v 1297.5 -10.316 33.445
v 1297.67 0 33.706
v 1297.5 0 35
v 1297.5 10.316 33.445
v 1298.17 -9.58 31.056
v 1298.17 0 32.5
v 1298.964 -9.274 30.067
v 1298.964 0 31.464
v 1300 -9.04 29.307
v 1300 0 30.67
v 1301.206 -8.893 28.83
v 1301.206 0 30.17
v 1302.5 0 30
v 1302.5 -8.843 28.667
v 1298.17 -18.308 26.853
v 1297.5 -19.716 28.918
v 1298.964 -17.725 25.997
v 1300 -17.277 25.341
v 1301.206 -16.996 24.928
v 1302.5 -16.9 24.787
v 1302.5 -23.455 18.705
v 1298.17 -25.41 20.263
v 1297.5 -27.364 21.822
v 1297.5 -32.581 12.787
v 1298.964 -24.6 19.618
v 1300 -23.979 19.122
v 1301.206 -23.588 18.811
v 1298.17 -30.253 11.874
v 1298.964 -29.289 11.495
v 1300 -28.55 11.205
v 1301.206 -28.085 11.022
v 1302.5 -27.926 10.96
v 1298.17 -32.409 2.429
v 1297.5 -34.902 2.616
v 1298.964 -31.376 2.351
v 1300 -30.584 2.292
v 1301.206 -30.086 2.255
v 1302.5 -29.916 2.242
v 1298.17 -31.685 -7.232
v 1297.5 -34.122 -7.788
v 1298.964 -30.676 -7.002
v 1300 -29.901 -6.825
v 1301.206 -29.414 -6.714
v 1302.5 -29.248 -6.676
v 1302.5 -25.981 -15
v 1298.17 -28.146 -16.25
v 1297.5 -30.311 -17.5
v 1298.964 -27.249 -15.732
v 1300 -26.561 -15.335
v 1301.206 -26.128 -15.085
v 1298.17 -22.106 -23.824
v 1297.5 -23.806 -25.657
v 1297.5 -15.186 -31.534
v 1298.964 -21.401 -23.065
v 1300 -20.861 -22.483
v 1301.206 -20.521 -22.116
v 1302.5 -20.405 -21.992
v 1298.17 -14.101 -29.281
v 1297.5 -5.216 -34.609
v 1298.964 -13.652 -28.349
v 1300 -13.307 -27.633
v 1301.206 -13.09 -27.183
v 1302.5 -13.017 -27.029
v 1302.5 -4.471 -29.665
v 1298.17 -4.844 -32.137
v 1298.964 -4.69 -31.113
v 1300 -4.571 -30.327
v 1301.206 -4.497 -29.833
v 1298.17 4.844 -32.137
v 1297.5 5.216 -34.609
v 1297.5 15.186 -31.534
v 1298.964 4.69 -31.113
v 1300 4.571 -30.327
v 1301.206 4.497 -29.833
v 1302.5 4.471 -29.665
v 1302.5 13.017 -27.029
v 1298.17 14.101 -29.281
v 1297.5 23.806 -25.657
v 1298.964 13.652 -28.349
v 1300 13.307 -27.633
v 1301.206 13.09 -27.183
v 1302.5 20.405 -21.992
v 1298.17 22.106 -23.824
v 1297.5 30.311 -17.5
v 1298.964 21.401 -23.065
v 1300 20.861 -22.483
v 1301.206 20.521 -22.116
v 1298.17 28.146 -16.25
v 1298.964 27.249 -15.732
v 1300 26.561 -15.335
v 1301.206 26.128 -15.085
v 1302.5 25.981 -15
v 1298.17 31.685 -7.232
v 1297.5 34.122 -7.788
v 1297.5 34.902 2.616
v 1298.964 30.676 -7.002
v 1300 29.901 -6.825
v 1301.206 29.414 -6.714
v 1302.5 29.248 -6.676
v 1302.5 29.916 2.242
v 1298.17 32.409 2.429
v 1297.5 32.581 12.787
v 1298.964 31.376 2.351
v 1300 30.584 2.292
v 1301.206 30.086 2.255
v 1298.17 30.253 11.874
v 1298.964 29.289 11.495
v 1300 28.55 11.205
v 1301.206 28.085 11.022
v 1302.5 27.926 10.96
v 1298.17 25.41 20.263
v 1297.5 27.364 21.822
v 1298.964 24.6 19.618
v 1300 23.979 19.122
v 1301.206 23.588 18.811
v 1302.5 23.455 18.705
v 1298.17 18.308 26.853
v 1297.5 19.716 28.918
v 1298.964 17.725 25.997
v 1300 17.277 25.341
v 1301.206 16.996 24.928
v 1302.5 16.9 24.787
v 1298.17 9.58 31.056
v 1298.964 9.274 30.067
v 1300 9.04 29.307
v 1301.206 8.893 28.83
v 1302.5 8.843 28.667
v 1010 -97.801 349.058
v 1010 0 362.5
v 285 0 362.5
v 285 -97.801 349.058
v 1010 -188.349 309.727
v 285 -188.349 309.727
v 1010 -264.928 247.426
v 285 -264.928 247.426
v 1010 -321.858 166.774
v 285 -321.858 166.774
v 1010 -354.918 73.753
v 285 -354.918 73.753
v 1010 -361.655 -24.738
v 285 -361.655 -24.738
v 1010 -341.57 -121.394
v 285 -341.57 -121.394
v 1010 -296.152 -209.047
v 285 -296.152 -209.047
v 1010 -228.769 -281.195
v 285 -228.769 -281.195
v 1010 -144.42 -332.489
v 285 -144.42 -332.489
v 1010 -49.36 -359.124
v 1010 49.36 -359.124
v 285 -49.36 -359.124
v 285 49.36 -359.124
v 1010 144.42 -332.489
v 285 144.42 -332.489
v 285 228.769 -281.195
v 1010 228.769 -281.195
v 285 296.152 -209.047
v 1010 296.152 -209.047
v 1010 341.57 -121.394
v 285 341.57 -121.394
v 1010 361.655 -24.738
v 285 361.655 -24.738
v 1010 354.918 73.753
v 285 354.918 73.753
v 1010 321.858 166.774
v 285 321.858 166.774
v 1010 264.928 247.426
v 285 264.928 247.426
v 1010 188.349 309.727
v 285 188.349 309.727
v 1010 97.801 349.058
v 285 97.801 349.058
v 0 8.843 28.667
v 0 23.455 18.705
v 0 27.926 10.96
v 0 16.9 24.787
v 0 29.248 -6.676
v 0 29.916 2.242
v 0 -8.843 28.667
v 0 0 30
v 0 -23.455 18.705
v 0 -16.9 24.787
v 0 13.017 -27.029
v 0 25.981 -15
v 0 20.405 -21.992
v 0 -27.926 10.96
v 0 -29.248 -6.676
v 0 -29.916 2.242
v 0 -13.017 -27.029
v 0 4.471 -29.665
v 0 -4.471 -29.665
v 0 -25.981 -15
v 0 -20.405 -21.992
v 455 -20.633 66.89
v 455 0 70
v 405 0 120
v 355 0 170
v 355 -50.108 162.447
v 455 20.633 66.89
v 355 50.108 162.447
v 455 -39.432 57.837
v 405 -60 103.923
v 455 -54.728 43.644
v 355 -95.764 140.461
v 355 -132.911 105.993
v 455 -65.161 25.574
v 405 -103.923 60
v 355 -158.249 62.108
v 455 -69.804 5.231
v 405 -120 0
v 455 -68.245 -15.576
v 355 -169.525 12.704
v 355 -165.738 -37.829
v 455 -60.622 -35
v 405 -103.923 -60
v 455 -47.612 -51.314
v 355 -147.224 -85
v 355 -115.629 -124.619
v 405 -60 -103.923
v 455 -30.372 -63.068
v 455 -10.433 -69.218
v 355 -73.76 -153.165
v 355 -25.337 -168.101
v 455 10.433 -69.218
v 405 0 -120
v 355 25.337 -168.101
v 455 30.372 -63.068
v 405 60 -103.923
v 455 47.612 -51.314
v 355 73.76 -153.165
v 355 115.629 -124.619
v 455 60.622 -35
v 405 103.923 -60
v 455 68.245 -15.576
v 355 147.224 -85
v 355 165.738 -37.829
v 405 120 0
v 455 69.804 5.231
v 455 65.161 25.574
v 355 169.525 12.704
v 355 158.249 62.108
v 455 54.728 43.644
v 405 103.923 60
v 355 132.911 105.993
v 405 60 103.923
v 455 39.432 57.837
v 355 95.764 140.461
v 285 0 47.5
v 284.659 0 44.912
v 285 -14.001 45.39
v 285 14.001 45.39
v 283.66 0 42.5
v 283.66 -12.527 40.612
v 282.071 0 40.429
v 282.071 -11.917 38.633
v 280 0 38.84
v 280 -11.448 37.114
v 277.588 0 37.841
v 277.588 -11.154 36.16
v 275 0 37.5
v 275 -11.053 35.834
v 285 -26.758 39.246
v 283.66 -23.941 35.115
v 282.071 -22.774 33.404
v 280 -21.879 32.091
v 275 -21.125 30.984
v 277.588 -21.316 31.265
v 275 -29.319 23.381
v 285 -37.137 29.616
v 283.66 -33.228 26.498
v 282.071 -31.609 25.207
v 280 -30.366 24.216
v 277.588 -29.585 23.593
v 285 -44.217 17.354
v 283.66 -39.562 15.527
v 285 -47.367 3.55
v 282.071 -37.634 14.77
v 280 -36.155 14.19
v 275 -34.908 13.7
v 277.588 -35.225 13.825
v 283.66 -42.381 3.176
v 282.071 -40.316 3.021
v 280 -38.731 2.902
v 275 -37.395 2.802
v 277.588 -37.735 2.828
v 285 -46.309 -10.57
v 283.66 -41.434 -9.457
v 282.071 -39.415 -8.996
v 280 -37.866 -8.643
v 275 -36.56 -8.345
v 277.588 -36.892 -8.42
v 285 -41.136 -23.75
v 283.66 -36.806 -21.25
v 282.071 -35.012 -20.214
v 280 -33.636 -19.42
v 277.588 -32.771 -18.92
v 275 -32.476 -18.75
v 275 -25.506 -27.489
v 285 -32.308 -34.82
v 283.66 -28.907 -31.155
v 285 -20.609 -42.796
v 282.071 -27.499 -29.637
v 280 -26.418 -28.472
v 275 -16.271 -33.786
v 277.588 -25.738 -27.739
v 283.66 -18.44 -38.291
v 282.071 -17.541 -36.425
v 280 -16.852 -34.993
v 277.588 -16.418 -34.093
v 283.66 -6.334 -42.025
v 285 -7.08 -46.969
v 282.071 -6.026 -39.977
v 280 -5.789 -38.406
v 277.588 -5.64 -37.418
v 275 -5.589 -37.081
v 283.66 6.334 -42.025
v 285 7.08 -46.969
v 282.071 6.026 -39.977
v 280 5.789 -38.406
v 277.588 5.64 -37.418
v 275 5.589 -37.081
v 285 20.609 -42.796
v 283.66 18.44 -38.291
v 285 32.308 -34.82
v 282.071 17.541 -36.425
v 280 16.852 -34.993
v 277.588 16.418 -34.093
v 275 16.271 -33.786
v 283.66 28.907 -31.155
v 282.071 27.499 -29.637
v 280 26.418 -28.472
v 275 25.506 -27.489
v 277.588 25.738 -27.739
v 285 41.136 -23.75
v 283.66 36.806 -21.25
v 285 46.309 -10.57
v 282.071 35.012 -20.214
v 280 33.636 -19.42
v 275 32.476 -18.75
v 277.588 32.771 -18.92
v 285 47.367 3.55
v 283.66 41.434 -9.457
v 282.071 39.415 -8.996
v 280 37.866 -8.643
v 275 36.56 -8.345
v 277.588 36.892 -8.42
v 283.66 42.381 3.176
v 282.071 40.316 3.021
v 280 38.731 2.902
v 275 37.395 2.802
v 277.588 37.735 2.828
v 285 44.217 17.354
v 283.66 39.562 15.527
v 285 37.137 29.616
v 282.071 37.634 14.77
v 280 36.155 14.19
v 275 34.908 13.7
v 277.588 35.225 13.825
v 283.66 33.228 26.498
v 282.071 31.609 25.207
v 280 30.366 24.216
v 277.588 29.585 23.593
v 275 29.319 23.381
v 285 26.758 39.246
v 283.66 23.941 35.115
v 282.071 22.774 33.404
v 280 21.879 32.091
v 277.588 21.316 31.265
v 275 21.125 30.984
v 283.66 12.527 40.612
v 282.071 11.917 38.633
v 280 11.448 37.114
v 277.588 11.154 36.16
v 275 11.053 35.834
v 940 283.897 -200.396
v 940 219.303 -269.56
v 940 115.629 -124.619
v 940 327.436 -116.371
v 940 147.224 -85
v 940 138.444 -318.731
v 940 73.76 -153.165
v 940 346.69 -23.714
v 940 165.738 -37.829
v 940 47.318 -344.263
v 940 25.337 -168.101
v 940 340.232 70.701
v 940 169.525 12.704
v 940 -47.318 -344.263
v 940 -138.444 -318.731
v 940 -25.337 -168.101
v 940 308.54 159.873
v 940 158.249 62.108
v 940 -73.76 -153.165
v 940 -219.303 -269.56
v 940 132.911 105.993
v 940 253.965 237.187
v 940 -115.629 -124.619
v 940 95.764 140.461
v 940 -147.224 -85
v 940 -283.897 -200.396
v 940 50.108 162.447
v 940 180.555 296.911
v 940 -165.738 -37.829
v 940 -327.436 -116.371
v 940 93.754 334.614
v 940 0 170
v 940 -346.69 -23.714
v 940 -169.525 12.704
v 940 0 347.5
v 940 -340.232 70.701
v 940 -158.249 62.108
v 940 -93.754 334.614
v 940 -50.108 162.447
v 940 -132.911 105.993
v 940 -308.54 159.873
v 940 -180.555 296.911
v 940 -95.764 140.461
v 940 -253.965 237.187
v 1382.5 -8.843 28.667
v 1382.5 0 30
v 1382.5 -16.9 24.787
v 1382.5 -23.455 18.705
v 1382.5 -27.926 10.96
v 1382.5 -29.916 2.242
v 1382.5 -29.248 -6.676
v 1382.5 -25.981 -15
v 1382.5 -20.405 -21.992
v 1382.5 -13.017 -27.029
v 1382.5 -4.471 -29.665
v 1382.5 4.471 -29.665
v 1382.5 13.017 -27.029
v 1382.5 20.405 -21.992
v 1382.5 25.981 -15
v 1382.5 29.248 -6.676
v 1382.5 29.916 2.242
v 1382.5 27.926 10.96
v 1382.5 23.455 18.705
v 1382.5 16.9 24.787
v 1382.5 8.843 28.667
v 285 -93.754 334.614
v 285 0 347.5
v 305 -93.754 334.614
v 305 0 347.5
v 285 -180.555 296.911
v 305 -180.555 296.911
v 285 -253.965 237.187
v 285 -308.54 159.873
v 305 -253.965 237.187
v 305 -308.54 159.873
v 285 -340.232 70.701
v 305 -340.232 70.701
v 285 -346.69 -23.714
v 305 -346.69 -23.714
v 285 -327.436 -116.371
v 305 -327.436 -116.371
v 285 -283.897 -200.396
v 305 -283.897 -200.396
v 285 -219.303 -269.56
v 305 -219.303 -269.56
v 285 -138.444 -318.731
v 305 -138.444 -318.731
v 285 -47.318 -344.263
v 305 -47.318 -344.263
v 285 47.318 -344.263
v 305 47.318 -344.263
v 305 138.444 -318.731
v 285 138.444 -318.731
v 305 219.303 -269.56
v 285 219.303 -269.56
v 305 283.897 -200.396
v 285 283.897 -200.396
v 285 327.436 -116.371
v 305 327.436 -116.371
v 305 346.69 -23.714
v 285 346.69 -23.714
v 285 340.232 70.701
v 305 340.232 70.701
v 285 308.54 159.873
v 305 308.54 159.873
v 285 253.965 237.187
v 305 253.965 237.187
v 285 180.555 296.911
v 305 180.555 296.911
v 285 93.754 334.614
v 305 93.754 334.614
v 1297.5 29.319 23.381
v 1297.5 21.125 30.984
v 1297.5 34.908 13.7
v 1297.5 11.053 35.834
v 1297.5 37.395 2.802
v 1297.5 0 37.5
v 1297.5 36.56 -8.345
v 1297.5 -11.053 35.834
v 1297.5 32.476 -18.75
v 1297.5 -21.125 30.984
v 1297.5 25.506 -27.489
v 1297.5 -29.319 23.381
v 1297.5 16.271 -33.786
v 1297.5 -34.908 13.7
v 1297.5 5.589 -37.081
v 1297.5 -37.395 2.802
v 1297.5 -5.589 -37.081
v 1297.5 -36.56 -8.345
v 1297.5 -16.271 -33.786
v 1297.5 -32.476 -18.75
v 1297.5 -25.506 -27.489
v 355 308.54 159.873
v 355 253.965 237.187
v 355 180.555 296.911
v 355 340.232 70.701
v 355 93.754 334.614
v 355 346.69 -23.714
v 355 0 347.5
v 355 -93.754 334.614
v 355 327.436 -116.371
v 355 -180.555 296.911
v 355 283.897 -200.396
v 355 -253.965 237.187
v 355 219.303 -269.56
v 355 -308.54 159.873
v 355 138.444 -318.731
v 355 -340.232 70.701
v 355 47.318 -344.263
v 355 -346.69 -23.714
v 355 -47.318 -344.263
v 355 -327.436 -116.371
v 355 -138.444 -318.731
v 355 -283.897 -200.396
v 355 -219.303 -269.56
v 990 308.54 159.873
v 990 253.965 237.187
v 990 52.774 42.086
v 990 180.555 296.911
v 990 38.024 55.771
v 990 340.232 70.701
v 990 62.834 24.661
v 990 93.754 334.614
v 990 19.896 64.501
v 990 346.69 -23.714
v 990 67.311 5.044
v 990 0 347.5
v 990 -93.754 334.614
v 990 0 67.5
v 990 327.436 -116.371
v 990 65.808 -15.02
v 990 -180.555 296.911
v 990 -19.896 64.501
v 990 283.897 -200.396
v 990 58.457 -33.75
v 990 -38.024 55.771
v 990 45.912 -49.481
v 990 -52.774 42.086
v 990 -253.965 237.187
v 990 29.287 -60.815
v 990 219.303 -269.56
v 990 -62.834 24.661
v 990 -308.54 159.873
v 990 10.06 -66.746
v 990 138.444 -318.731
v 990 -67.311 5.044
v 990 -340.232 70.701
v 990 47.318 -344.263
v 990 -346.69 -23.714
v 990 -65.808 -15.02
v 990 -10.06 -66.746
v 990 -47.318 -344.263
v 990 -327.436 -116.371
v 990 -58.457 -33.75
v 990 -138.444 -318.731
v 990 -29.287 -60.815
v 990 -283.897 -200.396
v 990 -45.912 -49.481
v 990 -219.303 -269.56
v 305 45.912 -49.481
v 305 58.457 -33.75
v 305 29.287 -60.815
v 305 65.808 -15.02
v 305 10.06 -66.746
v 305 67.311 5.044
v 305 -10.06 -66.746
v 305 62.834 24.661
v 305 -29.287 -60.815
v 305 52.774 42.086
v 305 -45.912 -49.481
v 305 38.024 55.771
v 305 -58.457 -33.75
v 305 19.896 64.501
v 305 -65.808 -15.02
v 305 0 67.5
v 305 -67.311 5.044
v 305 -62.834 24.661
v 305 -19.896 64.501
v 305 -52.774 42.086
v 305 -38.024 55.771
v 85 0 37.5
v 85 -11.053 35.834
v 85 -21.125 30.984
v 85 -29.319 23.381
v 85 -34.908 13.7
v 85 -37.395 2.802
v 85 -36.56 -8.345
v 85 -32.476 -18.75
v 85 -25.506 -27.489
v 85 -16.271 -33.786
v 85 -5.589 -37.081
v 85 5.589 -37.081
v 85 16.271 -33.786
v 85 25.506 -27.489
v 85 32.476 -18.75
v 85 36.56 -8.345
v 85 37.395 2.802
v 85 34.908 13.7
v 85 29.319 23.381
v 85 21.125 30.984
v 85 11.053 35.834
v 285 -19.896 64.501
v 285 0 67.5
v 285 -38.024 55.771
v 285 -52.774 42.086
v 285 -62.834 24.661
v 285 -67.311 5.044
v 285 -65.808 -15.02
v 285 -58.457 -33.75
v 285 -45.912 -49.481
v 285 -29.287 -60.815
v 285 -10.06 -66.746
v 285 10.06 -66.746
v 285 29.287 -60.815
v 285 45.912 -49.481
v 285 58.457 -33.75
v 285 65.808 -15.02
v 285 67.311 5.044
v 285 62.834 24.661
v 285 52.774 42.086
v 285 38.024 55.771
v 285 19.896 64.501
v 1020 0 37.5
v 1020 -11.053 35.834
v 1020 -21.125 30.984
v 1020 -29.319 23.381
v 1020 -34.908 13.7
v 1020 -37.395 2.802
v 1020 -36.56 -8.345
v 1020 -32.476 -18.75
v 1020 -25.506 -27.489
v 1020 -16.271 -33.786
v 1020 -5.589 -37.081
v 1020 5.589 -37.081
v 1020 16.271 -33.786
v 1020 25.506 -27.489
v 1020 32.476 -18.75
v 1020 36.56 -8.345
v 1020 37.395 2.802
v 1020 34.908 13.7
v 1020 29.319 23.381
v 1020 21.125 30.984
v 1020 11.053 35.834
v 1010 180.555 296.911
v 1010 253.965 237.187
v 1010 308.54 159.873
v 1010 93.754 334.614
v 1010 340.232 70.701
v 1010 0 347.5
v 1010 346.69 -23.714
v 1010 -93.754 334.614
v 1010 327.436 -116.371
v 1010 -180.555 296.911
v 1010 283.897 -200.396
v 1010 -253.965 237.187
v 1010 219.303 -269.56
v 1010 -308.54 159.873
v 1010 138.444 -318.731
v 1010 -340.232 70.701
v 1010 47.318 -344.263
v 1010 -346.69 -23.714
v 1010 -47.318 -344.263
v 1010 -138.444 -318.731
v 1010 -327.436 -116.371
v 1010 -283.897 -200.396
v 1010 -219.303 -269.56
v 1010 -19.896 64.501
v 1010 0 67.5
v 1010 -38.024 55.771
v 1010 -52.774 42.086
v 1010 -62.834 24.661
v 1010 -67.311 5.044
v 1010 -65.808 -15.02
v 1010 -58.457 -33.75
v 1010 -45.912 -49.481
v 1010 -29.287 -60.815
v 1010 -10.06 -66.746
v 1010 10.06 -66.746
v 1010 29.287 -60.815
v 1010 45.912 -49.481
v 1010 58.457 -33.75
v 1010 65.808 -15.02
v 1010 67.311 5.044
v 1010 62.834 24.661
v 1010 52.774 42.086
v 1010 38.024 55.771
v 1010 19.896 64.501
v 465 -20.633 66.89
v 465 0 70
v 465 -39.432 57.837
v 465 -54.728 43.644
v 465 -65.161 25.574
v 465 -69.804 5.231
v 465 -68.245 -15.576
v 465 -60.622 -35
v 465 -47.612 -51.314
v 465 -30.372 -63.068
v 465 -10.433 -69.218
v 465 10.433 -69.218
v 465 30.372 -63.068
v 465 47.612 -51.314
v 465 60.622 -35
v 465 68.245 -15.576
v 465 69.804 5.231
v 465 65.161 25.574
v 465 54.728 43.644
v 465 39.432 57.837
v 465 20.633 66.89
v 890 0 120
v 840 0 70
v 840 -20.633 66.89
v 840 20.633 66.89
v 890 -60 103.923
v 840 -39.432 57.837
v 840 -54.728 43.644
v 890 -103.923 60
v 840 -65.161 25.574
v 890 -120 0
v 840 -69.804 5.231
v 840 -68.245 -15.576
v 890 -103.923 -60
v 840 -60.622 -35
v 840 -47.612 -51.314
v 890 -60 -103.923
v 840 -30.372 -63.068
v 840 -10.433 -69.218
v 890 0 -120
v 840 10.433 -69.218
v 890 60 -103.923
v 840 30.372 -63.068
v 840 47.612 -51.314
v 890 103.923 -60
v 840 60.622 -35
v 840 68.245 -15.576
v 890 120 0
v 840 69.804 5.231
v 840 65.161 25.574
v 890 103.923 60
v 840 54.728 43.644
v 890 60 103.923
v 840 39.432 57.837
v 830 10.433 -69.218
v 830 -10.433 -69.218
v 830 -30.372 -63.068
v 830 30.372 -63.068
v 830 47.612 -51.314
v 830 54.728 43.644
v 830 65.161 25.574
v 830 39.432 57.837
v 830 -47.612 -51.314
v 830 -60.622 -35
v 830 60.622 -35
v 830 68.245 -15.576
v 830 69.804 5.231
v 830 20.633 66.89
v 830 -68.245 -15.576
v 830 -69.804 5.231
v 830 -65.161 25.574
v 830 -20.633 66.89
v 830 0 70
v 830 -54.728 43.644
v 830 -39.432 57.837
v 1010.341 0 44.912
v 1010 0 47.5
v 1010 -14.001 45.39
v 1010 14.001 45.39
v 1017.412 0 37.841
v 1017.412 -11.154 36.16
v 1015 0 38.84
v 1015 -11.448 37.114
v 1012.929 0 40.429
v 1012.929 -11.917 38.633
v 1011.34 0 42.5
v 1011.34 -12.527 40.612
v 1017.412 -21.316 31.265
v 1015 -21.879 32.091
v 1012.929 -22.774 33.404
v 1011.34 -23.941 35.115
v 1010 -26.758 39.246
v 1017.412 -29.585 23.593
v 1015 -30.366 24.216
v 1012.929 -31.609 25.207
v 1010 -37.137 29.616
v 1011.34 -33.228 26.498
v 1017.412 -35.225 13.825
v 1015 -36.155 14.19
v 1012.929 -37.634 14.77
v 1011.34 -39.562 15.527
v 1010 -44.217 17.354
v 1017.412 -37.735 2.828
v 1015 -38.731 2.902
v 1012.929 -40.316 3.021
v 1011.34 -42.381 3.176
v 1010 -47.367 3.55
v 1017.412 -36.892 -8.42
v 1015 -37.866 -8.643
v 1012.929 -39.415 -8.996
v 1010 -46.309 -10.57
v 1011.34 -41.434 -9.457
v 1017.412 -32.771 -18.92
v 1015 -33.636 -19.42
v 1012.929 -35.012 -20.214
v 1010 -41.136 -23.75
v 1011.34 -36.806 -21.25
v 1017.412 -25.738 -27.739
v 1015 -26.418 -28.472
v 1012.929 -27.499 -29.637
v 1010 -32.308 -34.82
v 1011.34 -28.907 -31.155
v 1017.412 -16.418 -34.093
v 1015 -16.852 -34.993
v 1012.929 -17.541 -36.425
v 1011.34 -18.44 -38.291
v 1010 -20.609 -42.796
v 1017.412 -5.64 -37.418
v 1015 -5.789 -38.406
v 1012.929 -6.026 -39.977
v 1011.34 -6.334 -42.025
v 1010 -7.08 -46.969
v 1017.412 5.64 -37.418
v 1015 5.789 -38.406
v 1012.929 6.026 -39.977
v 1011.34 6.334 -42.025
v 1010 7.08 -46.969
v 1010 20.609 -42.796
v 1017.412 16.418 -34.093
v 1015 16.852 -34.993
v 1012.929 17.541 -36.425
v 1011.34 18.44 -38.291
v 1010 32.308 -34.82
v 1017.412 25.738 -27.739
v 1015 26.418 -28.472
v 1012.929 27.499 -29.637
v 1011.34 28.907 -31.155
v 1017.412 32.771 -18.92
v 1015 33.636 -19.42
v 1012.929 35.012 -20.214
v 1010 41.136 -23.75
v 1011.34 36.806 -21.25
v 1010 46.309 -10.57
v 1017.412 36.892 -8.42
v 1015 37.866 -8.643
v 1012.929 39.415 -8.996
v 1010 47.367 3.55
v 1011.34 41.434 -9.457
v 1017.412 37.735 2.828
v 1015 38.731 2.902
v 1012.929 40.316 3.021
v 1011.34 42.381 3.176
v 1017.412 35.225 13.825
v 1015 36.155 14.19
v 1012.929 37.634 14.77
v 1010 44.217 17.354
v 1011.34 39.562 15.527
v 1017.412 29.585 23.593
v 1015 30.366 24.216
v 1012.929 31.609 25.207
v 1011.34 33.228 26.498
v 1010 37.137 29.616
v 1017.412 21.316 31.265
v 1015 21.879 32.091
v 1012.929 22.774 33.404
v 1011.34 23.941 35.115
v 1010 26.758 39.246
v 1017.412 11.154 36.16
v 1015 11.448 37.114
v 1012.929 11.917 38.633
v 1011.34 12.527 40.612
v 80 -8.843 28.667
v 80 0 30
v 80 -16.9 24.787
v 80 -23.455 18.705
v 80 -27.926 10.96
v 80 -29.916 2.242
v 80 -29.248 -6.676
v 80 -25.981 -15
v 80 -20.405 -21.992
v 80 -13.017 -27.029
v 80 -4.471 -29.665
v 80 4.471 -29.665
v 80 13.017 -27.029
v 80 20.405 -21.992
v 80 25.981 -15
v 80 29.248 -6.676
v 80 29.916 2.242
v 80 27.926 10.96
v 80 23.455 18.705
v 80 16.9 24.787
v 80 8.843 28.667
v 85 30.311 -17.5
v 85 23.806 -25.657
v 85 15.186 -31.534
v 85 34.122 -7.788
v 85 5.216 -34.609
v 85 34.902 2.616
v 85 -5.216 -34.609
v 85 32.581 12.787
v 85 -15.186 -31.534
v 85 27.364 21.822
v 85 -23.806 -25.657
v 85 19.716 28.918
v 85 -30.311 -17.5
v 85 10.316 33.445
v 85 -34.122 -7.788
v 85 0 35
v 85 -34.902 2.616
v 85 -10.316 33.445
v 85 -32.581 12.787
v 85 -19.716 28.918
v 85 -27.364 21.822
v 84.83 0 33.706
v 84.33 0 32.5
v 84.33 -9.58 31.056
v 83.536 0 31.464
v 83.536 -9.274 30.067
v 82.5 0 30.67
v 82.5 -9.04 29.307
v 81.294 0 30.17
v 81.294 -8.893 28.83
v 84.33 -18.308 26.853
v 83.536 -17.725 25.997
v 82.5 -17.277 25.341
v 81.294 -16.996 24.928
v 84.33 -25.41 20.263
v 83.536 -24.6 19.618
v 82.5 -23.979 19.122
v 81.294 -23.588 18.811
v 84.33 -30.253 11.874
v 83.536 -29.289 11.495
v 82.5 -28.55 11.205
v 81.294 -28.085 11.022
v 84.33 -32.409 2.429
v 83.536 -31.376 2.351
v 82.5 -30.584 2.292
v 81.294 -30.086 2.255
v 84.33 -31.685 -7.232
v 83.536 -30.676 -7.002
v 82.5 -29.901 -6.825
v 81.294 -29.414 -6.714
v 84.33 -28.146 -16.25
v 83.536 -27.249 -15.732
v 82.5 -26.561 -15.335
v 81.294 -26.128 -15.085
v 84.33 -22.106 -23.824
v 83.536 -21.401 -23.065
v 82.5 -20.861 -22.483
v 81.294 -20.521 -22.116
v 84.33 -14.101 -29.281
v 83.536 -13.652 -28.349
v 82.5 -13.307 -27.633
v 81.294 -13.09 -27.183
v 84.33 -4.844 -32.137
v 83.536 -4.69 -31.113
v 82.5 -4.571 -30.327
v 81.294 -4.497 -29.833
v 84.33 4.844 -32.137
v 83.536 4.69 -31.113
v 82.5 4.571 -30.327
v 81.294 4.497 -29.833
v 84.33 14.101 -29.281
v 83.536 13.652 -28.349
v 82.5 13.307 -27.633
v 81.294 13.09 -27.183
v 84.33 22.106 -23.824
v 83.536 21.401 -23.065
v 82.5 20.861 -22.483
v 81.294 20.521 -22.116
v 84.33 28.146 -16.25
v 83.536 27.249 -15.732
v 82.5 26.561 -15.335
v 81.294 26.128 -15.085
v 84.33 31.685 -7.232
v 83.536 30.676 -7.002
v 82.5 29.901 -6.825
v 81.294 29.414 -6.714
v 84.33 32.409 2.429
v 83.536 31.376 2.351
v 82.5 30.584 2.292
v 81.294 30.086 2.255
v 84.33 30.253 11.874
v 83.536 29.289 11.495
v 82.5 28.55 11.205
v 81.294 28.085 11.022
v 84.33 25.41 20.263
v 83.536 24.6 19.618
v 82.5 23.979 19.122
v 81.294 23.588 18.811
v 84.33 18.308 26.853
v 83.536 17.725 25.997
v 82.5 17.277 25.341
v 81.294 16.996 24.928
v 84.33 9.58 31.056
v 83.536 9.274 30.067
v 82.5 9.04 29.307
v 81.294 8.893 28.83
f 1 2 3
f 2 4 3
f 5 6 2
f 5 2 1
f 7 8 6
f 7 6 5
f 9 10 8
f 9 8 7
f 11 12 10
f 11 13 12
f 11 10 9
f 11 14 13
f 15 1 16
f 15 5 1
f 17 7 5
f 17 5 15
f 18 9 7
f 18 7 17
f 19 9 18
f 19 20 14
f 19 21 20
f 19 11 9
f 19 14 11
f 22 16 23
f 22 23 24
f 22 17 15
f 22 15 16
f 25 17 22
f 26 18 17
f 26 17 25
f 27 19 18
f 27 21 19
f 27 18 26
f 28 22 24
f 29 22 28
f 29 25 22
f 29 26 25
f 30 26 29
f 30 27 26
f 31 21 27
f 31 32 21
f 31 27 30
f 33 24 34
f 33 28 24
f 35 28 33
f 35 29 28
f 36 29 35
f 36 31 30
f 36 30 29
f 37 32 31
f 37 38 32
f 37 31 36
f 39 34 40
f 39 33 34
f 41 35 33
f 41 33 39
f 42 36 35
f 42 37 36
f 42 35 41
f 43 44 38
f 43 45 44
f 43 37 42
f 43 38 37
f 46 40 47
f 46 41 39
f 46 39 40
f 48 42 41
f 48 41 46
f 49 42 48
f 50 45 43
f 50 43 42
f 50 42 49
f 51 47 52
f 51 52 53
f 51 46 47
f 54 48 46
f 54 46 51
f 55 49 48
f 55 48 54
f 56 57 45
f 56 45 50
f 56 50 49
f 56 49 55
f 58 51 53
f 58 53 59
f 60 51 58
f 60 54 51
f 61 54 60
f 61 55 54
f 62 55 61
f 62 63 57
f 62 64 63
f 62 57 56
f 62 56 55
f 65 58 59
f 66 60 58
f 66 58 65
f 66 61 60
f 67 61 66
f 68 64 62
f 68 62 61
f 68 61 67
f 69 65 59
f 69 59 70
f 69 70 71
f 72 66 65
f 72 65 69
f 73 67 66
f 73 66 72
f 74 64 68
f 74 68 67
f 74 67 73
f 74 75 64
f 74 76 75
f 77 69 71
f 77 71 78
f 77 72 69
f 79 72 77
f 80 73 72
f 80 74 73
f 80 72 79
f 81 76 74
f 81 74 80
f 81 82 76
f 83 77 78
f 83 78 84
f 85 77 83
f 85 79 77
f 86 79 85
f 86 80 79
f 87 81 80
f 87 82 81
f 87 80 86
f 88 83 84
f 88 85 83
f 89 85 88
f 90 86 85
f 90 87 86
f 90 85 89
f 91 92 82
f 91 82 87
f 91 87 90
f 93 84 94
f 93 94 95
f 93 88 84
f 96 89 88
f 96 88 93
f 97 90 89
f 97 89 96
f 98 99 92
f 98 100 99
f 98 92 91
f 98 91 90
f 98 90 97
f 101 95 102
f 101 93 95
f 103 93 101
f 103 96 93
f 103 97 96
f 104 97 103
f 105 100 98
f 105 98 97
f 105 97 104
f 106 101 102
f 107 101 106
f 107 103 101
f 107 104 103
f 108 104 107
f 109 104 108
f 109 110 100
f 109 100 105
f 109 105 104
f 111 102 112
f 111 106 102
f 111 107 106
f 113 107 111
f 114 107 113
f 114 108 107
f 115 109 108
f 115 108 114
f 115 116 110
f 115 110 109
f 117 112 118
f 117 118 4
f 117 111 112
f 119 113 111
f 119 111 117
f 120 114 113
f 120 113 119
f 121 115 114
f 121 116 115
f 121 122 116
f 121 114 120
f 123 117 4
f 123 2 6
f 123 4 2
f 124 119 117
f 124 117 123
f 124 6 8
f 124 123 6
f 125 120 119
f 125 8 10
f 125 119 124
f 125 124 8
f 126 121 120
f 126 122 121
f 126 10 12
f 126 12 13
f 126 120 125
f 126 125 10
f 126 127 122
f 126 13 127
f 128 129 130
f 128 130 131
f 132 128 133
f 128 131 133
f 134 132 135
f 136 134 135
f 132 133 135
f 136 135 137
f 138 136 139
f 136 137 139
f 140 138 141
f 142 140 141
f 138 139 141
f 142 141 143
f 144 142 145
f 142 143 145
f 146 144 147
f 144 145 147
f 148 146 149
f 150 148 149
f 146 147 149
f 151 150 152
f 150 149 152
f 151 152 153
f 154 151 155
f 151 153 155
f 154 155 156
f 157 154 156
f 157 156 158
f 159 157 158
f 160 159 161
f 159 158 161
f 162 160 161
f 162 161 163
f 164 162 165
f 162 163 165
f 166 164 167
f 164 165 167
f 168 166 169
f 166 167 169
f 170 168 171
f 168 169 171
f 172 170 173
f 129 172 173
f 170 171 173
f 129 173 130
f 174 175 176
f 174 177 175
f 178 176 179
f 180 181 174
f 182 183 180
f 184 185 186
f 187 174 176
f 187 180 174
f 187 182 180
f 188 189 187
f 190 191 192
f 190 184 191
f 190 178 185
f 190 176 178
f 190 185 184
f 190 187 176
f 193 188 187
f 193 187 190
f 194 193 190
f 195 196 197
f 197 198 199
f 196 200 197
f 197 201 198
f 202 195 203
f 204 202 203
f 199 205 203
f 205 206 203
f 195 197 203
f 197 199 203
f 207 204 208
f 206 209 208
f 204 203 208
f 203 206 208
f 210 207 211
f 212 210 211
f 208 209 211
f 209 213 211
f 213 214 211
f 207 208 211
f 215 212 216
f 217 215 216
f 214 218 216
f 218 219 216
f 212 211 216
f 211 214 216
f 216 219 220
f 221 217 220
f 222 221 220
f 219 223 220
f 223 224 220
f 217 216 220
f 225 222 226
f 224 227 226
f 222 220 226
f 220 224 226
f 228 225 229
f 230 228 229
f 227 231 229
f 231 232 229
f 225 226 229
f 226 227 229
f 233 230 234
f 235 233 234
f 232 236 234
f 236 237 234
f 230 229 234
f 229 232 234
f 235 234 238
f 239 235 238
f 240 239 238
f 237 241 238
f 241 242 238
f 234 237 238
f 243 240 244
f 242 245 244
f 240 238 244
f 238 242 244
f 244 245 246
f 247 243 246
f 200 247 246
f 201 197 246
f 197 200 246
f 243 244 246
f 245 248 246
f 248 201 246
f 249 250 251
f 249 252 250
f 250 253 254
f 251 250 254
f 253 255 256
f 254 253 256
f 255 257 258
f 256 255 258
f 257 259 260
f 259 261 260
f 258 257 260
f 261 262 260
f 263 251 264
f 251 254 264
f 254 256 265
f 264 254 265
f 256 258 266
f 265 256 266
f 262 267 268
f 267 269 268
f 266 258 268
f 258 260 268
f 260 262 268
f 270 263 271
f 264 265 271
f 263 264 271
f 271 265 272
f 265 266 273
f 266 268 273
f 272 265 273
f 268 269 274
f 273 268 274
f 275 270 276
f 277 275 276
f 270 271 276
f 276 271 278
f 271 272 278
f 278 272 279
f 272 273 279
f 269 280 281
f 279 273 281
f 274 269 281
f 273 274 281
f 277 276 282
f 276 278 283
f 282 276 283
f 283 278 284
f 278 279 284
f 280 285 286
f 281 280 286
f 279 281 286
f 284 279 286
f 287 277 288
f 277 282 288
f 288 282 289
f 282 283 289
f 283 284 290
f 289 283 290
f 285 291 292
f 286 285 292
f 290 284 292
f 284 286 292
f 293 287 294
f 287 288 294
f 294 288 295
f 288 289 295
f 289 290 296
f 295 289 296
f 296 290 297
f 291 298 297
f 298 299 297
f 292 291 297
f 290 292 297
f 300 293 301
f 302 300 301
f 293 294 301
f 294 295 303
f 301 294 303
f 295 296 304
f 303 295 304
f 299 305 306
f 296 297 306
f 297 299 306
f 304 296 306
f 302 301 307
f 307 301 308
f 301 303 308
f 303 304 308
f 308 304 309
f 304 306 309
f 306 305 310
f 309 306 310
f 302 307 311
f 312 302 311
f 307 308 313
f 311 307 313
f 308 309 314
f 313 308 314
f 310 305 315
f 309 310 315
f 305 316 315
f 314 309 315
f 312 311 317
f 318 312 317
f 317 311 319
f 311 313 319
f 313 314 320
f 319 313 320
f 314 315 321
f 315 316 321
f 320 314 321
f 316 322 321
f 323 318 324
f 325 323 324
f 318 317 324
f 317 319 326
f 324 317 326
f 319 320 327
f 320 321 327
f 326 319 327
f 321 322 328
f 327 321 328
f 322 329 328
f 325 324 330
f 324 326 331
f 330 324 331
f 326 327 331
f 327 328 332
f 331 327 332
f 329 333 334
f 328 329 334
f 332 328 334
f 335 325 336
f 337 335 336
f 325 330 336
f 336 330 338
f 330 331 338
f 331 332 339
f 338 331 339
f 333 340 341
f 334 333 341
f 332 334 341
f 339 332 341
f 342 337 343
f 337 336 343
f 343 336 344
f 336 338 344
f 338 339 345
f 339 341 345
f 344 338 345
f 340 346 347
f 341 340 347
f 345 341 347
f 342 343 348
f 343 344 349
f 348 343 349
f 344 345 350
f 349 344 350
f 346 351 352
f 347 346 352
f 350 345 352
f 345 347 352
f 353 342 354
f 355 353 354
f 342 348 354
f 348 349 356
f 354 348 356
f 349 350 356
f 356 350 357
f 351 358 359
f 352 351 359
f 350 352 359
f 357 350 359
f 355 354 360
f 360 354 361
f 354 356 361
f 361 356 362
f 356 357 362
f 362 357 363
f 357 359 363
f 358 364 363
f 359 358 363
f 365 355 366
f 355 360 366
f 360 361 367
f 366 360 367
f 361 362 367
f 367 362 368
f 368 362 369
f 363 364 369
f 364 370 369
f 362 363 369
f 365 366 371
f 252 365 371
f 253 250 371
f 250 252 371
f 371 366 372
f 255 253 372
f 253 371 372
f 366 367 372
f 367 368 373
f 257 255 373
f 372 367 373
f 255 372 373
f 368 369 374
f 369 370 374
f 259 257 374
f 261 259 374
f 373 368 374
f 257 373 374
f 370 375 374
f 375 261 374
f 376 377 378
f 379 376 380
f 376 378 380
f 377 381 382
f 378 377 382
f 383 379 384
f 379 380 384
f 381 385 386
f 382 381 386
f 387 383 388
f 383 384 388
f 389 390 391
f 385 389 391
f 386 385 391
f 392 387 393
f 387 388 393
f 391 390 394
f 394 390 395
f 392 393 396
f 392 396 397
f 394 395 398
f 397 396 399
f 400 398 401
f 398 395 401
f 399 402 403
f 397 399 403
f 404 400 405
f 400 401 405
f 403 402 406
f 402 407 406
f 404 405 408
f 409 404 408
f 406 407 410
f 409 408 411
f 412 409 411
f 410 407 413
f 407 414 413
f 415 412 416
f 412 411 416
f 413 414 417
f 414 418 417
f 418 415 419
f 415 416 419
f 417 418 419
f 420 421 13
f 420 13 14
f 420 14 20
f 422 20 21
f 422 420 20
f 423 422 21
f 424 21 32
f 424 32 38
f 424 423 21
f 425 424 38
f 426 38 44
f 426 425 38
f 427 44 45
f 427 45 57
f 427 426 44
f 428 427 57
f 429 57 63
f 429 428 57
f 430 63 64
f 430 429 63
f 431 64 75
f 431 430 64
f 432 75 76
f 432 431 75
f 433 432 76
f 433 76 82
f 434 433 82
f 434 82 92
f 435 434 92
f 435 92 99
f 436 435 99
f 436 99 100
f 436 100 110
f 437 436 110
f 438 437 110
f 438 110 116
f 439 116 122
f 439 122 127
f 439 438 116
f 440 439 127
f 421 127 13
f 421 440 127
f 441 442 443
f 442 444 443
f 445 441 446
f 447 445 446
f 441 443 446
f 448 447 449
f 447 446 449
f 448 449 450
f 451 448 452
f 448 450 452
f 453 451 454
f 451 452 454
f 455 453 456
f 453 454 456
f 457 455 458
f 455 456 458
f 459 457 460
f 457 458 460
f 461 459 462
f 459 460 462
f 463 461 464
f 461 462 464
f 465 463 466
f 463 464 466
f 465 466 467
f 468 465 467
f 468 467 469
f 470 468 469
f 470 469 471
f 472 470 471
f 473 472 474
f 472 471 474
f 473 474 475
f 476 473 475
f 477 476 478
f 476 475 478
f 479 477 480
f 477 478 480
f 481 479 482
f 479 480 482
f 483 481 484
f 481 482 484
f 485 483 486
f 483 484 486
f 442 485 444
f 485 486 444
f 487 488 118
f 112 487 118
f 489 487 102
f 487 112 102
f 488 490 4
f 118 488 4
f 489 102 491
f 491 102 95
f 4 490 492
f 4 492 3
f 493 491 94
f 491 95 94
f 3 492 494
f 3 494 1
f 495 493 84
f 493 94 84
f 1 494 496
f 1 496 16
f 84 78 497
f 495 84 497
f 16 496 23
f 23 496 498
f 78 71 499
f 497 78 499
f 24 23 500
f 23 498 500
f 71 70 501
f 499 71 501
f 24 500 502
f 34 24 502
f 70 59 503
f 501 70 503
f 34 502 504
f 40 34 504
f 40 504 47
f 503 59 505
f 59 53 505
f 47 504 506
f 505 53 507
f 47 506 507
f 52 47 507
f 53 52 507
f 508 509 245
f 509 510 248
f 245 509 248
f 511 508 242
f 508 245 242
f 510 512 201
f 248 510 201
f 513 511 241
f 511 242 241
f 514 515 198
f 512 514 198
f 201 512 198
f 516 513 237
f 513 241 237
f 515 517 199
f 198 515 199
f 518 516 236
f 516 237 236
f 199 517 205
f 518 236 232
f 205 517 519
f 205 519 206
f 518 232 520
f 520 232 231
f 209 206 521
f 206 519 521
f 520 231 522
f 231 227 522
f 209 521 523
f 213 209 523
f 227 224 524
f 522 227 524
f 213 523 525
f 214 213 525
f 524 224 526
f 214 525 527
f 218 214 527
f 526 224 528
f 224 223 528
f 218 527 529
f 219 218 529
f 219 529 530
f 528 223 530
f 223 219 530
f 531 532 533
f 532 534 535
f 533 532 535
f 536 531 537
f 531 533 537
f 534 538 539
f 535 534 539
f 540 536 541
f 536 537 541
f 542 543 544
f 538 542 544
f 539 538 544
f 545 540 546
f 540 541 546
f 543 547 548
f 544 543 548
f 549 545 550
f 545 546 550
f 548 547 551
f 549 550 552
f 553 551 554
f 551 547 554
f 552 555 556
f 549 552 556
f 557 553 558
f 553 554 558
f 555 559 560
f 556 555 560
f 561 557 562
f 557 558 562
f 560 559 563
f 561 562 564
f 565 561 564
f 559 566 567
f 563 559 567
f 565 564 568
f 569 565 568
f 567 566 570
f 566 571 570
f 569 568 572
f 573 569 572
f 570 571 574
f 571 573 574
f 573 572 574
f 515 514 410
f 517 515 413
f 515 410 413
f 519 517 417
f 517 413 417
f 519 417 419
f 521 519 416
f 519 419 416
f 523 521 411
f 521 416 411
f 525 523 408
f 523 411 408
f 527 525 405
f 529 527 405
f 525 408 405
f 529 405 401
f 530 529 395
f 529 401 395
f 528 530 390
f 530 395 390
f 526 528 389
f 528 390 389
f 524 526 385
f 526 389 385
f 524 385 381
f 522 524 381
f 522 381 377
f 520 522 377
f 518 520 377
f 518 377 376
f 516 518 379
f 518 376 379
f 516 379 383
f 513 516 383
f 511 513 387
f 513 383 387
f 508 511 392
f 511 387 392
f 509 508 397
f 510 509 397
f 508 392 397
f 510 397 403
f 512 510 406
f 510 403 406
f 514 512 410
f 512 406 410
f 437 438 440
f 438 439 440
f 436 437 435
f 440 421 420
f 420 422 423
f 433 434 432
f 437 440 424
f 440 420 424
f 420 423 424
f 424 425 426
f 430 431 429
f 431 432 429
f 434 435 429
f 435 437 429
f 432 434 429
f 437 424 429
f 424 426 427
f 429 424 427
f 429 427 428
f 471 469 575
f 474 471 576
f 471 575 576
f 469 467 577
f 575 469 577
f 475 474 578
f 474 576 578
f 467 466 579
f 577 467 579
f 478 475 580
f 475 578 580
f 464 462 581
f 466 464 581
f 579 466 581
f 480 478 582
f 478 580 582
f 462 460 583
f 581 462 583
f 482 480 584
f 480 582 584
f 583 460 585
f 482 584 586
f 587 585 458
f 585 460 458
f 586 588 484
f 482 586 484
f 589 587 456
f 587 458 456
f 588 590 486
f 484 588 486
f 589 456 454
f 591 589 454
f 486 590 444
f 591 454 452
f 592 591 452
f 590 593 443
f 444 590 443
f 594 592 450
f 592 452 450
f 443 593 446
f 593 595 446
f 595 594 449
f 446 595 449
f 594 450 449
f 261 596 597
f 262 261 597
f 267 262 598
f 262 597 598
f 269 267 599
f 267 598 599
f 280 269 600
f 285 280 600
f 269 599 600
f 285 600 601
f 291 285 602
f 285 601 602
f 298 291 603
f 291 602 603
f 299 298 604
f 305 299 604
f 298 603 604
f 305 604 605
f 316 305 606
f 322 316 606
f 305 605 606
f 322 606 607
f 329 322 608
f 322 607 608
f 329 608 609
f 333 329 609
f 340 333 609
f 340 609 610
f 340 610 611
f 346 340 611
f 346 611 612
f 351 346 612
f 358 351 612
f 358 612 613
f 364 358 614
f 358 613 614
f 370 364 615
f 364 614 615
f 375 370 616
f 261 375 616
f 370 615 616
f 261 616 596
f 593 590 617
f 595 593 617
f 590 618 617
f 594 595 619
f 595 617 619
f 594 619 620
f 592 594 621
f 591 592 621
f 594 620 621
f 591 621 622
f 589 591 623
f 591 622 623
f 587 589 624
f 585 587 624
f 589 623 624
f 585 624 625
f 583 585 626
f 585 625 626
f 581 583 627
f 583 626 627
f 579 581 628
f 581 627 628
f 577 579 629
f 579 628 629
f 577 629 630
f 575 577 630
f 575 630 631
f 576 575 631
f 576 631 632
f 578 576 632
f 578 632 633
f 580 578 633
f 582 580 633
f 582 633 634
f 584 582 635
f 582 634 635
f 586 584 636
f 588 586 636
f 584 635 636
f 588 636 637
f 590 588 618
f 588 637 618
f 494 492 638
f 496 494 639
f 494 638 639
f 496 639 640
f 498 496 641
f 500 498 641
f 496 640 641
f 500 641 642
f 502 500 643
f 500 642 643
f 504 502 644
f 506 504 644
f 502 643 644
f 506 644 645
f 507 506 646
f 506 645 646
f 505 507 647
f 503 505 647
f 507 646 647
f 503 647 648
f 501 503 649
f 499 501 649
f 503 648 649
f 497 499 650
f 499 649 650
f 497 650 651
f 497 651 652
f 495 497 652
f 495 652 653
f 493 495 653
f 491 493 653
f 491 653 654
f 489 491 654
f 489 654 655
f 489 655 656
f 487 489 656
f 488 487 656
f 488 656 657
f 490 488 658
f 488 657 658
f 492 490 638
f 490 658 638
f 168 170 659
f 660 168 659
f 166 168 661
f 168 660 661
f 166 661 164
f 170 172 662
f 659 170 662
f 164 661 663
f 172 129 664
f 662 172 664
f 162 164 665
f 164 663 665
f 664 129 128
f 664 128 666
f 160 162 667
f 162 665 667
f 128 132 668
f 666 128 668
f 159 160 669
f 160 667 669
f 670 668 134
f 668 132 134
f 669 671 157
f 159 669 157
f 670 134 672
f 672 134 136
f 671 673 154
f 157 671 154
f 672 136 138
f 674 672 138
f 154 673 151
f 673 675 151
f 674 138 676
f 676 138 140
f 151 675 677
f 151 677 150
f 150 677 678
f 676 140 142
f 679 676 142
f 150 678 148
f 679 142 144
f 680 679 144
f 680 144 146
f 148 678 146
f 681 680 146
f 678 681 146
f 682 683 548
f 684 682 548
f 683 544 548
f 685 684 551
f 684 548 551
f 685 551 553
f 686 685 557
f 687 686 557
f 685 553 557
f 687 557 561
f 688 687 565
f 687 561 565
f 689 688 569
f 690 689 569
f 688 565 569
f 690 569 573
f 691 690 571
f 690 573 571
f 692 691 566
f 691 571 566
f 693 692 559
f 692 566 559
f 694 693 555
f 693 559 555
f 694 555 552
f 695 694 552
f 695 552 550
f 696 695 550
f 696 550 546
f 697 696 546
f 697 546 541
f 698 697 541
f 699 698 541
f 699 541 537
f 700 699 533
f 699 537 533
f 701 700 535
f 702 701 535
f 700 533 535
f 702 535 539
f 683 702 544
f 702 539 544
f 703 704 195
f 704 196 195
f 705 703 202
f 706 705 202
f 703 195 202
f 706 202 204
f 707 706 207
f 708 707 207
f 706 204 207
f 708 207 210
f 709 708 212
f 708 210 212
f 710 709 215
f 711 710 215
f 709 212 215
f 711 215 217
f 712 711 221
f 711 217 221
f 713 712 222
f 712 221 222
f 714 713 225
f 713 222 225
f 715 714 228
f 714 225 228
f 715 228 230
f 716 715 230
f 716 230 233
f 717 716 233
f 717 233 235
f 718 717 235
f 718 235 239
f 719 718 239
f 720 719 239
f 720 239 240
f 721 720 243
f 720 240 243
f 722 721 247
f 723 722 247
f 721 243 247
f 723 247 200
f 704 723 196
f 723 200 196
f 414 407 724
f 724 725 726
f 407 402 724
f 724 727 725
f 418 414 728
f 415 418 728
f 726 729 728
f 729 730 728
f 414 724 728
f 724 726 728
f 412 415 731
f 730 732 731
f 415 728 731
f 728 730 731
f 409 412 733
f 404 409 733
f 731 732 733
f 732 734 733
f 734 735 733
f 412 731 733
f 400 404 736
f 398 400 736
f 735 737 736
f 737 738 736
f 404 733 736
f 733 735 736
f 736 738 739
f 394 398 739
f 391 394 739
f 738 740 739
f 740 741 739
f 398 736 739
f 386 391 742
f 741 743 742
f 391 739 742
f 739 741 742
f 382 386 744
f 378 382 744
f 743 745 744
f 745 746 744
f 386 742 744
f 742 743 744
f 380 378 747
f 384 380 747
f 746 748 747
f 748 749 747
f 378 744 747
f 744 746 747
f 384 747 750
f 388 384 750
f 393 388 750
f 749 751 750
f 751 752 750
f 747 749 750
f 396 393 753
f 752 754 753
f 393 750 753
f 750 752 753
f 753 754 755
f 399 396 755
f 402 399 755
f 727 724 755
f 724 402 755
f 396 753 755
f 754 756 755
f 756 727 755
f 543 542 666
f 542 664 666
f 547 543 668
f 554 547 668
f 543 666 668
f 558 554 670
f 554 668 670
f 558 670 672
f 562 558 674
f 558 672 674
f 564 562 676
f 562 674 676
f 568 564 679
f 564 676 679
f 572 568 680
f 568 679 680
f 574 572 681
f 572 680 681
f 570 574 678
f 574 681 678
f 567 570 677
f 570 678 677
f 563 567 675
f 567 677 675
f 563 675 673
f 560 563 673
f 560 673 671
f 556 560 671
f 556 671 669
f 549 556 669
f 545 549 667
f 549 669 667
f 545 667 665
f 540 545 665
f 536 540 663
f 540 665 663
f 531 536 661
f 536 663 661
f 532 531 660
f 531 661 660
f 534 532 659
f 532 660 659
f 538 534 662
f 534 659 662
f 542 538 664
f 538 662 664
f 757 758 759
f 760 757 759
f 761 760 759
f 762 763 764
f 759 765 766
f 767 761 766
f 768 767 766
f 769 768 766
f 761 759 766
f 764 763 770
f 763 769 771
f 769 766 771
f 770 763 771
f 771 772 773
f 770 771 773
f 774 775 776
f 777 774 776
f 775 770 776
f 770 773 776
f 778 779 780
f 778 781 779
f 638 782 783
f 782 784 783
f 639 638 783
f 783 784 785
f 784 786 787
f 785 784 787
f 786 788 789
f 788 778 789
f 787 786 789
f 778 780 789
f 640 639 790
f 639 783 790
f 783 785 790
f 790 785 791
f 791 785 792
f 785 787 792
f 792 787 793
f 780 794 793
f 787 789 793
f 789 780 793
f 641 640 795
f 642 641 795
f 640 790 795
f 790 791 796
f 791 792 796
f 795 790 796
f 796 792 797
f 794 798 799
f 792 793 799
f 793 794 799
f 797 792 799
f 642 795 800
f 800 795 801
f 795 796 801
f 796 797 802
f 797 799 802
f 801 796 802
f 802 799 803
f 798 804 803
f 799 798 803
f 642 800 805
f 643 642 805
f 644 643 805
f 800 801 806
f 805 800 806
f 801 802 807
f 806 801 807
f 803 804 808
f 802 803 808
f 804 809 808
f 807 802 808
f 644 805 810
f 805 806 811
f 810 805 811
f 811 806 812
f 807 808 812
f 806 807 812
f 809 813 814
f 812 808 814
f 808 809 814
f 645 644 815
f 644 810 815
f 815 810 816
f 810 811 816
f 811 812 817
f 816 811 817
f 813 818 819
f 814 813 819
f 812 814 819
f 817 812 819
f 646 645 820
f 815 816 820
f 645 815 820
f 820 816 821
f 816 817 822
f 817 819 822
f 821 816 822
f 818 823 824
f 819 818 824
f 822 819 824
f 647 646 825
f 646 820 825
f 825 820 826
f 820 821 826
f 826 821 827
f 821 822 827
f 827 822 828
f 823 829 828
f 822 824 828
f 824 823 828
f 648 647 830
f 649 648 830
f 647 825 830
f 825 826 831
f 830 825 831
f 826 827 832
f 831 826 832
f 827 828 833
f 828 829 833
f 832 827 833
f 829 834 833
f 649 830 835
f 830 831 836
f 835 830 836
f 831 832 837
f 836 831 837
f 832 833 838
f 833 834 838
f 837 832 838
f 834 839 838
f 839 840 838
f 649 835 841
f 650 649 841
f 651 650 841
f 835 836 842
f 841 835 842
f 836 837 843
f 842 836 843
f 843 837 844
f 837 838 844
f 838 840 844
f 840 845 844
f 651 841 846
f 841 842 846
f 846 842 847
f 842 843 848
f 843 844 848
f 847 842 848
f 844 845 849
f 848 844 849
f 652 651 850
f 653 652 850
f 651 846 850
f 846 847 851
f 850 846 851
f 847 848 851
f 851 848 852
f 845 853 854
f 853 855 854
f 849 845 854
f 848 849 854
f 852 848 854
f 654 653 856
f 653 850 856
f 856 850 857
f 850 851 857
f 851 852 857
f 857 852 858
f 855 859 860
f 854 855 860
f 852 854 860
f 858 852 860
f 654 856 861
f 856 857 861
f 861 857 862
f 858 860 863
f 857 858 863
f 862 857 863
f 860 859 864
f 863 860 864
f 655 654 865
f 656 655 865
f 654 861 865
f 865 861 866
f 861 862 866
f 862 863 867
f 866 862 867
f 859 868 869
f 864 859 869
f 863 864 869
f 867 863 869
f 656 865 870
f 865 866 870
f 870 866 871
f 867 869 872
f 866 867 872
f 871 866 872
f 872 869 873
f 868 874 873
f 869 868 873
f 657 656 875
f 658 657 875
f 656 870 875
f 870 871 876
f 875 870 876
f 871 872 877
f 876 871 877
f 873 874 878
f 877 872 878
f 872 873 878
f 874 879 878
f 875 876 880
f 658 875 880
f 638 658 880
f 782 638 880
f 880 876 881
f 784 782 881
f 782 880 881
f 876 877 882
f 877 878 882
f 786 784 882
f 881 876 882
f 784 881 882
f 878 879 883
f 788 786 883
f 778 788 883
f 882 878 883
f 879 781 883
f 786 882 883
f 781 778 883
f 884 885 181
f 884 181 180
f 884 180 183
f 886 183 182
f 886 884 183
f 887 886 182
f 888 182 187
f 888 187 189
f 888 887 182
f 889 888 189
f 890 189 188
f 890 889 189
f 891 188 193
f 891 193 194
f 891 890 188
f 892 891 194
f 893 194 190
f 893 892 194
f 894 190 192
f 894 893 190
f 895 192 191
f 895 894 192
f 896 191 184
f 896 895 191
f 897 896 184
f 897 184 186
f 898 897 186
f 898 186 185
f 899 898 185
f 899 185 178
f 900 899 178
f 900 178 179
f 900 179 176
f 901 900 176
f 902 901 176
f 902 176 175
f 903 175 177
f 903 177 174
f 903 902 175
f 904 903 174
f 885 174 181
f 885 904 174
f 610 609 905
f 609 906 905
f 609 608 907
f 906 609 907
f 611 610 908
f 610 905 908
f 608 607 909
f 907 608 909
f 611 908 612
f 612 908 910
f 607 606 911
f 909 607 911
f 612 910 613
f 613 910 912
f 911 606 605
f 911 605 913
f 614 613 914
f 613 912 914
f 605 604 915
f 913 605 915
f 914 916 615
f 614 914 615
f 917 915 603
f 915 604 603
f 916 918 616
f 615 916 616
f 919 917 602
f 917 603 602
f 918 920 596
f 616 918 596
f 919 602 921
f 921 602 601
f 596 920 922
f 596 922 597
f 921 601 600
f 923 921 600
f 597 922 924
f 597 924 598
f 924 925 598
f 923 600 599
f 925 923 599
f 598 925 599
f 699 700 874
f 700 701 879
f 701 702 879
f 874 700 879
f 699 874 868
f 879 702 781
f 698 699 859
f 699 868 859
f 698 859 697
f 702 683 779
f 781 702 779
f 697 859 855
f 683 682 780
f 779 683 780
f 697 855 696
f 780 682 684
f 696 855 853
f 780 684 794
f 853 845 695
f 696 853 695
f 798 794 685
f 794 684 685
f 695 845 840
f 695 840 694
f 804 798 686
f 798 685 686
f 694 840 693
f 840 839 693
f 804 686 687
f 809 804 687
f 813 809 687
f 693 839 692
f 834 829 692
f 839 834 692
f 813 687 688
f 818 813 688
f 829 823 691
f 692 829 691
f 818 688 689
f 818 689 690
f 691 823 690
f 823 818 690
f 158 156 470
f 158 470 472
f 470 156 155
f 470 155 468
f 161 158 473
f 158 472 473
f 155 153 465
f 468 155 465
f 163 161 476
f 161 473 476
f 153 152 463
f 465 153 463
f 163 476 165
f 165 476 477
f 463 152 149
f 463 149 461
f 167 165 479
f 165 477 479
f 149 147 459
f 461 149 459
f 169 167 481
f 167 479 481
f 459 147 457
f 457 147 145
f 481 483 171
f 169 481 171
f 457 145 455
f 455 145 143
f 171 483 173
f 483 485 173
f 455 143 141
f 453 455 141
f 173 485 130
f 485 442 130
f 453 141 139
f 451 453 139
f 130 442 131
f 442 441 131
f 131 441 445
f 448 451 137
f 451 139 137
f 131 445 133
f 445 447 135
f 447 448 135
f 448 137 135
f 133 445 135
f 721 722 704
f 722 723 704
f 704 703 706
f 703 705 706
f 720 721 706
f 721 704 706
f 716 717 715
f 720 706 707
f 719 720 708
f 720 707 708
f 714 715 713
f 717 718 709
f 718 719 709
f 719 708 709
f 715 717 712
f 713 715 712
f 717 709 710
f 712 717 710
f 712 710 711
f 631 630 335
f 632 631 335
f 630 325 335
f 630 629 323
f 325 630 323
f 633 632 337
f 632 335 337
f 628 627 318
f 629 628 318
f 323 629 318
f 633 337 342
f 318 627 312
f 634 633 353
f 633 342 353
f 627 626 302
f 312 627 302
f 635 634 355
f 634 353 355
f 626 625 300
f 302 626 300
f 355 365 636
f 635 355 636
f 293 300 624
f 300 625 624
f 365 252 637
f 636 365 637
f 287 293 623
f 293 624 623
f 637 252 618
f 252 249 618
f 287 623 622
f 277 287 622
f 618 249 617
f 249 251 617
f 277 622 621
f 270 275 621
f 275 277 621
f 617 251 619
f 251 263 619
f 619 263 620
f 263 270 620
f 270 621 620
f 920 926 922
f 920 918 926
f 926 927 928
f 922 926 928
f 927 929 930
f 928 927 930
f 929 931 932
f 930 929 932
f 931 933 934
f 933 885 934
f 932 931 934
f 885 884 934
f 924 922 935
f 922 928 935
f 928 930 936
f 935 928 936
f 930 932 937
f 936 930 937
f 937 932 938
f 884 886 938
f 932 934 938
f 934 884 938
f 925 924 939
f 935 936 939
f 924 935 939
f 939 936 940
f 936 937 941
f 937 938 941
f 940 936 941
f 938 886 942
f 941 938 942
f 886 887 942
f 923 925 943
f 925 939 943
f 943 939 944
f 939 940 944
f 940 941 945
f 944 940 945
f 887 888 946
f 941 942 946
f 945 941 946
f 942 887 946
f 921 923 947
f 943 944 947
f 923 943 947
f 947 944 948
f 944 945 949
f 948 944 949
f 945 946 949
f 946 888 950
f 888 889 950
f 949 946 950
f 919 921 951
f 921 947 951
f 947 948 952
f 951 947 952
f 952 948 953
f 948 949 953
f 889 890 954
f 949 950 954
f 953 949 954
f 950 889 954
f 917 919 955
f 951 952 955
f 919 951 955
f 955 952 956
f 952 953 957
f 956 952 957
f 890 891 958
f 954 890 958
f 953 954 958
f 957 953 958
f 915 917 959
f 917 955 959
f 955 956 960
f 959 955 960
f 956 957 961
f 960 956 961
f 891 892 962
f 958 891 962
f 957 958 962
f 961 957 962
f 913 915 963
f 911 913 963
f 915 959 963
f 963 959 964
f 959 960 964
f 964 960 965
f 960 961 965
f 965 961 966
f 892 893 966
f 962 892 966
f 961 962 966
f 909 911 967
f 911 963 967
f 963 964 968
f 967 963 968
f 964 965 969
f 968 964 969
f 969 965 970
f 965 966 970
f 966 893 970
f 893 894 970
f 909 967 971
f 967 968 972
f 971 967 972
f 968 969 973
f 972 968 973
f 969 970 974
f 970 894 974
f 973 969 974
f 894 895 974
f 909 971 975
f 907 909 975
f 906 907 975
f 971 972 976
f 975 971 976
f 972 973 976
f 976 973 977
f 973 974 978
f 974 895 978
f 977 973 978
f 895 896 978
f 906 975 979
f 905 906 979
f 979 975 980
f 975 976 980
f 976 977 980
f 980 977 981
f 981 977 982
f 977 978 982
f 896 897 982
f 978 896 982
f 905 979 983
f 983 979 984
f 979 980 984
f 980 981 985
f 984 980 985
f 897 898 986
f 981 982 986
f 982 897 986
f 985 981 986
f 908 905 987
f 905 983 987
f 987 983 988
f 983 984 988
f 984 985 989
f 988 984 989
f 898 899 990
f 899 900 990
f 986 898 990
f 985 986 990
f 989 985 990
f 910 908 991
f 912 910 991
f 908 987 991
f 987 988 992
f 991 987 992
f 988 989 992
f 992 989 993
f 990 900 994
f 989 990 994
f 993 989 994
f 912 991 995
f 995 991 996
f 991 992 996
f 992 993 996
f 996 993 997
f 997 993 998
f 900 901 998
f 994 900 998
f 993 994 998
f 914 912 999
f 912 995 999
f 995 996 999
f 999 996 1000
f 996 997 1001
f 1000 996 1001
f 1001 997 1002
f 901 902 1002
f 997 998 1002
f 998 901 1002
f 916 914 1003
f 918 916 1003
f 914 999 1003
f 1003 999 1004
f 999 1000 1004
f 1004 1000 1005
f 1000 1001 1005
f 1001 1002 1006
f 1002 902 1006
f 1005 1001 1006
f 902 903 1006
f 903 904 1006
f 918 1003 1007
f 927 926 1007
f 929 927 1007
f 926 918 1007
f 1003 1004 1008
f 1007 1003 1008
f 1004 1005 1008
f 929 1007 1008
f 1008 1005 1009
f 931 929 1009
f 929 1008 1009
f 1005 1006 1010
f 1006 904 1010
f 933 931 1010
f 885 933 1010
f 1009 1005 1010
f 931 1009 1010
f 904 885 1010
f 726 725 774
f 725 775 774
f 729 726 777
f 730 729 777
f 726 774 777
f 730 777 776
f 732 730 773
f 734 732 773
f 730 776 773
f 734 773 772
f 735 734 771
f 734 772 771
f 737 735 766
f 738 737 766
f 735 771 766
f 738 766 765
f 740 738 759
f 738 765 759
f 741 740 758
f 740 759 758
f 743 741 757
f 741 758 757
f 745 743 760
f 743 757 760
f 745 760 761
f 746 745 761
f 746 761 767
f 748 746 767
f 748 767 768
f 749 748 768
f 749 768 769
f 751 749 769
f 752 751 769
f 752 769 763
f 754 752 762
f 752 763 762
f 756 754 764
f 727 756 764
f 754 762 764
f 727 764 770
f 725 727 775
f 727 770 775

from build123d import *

# Parameters (mm, degrees)
F0_W = 85
F0_H = 30
F2_R = 10
F3_R = 5


with BuildPart() as f1:
    # F0 (on Front) → F1 (revolve)
    with BuildSketch(Plane.XZ):
        with Locations((42.5, 15)):
            Rectangle(F0_W, F0_H)
        Polygon((85, 30), (85, 0), (285, 0), (285, 37.5), (85, 37.5), align=None)
        Polygon((285, 37.5), (285, 0), (465, 0), (465, 50), (355, 50), (285, 50), align=None)
        Polygon((285, 67.5), (285, 50), (355, 50), (355, 67.5), (305, 67.5), align=None)
        Polygon((355, 50), (465, 50), (465, 70), (455, 70), (355, 70), (355, 67.5), align=None)
        Polygon((305, 67.5), (355, 67.5), (355, 70), (355, 170), (355, 347.5), (305, 347.5), align=None)
        Polygon((355, 70), (455, 70), (355, 170), align=None)
        Polygon((285, 347.5), (305, 347.5), (355, 347.5), (647.5, 347.5), (940, 347.5), (990, 347.5), (1010, 347.5), (1010, 362.5), (285, 362.5), align=None)
        Polygon((990, 347.5), (940, 347.5), (940, 170), (940, 70), (940, 67.5), (990, 67.5), align=None)
        Polygon((940, 70), (940, 170), (840, 70), align=None)
        Polygon((1010, 67.5), (990, 67.5), (940, 67.5), (940, 70), (840, 70), (830, 70), (830, 50), (1010, 50), align=None)
        Polygon((1010, 37.5), (1010, 50), (830, 50), (830, 0), (1010, 0), align=None)
        Polygon((1297.5, 37.5), (1010, 37.5), (1010, 0), (1297.5, 0), (1297.5, 30), align=None)
        with Locations((1340, 15)):
            Rectangle(F0_W, F0_H)
    revolve(axis=Axis((691.25, 0, 0), (1, 0, 0)))

    # F2
    f2_edges = [f1.edges().sort_by_distance(p)[0] for p in [
        (1010, 0, -37.5),
        (285, 0, -37.5),
    ]]
    fillet(f2_edges, radius=F2_R)

    # F3
    f3_edges = [f1.edges().sort_by_distance(p)[0] for p in [
        (85, 0, -30),
        (1297.5, 0, -30),
    ]]
    fillet(f3_edges, radius=F3_R)


solid = f1.part
